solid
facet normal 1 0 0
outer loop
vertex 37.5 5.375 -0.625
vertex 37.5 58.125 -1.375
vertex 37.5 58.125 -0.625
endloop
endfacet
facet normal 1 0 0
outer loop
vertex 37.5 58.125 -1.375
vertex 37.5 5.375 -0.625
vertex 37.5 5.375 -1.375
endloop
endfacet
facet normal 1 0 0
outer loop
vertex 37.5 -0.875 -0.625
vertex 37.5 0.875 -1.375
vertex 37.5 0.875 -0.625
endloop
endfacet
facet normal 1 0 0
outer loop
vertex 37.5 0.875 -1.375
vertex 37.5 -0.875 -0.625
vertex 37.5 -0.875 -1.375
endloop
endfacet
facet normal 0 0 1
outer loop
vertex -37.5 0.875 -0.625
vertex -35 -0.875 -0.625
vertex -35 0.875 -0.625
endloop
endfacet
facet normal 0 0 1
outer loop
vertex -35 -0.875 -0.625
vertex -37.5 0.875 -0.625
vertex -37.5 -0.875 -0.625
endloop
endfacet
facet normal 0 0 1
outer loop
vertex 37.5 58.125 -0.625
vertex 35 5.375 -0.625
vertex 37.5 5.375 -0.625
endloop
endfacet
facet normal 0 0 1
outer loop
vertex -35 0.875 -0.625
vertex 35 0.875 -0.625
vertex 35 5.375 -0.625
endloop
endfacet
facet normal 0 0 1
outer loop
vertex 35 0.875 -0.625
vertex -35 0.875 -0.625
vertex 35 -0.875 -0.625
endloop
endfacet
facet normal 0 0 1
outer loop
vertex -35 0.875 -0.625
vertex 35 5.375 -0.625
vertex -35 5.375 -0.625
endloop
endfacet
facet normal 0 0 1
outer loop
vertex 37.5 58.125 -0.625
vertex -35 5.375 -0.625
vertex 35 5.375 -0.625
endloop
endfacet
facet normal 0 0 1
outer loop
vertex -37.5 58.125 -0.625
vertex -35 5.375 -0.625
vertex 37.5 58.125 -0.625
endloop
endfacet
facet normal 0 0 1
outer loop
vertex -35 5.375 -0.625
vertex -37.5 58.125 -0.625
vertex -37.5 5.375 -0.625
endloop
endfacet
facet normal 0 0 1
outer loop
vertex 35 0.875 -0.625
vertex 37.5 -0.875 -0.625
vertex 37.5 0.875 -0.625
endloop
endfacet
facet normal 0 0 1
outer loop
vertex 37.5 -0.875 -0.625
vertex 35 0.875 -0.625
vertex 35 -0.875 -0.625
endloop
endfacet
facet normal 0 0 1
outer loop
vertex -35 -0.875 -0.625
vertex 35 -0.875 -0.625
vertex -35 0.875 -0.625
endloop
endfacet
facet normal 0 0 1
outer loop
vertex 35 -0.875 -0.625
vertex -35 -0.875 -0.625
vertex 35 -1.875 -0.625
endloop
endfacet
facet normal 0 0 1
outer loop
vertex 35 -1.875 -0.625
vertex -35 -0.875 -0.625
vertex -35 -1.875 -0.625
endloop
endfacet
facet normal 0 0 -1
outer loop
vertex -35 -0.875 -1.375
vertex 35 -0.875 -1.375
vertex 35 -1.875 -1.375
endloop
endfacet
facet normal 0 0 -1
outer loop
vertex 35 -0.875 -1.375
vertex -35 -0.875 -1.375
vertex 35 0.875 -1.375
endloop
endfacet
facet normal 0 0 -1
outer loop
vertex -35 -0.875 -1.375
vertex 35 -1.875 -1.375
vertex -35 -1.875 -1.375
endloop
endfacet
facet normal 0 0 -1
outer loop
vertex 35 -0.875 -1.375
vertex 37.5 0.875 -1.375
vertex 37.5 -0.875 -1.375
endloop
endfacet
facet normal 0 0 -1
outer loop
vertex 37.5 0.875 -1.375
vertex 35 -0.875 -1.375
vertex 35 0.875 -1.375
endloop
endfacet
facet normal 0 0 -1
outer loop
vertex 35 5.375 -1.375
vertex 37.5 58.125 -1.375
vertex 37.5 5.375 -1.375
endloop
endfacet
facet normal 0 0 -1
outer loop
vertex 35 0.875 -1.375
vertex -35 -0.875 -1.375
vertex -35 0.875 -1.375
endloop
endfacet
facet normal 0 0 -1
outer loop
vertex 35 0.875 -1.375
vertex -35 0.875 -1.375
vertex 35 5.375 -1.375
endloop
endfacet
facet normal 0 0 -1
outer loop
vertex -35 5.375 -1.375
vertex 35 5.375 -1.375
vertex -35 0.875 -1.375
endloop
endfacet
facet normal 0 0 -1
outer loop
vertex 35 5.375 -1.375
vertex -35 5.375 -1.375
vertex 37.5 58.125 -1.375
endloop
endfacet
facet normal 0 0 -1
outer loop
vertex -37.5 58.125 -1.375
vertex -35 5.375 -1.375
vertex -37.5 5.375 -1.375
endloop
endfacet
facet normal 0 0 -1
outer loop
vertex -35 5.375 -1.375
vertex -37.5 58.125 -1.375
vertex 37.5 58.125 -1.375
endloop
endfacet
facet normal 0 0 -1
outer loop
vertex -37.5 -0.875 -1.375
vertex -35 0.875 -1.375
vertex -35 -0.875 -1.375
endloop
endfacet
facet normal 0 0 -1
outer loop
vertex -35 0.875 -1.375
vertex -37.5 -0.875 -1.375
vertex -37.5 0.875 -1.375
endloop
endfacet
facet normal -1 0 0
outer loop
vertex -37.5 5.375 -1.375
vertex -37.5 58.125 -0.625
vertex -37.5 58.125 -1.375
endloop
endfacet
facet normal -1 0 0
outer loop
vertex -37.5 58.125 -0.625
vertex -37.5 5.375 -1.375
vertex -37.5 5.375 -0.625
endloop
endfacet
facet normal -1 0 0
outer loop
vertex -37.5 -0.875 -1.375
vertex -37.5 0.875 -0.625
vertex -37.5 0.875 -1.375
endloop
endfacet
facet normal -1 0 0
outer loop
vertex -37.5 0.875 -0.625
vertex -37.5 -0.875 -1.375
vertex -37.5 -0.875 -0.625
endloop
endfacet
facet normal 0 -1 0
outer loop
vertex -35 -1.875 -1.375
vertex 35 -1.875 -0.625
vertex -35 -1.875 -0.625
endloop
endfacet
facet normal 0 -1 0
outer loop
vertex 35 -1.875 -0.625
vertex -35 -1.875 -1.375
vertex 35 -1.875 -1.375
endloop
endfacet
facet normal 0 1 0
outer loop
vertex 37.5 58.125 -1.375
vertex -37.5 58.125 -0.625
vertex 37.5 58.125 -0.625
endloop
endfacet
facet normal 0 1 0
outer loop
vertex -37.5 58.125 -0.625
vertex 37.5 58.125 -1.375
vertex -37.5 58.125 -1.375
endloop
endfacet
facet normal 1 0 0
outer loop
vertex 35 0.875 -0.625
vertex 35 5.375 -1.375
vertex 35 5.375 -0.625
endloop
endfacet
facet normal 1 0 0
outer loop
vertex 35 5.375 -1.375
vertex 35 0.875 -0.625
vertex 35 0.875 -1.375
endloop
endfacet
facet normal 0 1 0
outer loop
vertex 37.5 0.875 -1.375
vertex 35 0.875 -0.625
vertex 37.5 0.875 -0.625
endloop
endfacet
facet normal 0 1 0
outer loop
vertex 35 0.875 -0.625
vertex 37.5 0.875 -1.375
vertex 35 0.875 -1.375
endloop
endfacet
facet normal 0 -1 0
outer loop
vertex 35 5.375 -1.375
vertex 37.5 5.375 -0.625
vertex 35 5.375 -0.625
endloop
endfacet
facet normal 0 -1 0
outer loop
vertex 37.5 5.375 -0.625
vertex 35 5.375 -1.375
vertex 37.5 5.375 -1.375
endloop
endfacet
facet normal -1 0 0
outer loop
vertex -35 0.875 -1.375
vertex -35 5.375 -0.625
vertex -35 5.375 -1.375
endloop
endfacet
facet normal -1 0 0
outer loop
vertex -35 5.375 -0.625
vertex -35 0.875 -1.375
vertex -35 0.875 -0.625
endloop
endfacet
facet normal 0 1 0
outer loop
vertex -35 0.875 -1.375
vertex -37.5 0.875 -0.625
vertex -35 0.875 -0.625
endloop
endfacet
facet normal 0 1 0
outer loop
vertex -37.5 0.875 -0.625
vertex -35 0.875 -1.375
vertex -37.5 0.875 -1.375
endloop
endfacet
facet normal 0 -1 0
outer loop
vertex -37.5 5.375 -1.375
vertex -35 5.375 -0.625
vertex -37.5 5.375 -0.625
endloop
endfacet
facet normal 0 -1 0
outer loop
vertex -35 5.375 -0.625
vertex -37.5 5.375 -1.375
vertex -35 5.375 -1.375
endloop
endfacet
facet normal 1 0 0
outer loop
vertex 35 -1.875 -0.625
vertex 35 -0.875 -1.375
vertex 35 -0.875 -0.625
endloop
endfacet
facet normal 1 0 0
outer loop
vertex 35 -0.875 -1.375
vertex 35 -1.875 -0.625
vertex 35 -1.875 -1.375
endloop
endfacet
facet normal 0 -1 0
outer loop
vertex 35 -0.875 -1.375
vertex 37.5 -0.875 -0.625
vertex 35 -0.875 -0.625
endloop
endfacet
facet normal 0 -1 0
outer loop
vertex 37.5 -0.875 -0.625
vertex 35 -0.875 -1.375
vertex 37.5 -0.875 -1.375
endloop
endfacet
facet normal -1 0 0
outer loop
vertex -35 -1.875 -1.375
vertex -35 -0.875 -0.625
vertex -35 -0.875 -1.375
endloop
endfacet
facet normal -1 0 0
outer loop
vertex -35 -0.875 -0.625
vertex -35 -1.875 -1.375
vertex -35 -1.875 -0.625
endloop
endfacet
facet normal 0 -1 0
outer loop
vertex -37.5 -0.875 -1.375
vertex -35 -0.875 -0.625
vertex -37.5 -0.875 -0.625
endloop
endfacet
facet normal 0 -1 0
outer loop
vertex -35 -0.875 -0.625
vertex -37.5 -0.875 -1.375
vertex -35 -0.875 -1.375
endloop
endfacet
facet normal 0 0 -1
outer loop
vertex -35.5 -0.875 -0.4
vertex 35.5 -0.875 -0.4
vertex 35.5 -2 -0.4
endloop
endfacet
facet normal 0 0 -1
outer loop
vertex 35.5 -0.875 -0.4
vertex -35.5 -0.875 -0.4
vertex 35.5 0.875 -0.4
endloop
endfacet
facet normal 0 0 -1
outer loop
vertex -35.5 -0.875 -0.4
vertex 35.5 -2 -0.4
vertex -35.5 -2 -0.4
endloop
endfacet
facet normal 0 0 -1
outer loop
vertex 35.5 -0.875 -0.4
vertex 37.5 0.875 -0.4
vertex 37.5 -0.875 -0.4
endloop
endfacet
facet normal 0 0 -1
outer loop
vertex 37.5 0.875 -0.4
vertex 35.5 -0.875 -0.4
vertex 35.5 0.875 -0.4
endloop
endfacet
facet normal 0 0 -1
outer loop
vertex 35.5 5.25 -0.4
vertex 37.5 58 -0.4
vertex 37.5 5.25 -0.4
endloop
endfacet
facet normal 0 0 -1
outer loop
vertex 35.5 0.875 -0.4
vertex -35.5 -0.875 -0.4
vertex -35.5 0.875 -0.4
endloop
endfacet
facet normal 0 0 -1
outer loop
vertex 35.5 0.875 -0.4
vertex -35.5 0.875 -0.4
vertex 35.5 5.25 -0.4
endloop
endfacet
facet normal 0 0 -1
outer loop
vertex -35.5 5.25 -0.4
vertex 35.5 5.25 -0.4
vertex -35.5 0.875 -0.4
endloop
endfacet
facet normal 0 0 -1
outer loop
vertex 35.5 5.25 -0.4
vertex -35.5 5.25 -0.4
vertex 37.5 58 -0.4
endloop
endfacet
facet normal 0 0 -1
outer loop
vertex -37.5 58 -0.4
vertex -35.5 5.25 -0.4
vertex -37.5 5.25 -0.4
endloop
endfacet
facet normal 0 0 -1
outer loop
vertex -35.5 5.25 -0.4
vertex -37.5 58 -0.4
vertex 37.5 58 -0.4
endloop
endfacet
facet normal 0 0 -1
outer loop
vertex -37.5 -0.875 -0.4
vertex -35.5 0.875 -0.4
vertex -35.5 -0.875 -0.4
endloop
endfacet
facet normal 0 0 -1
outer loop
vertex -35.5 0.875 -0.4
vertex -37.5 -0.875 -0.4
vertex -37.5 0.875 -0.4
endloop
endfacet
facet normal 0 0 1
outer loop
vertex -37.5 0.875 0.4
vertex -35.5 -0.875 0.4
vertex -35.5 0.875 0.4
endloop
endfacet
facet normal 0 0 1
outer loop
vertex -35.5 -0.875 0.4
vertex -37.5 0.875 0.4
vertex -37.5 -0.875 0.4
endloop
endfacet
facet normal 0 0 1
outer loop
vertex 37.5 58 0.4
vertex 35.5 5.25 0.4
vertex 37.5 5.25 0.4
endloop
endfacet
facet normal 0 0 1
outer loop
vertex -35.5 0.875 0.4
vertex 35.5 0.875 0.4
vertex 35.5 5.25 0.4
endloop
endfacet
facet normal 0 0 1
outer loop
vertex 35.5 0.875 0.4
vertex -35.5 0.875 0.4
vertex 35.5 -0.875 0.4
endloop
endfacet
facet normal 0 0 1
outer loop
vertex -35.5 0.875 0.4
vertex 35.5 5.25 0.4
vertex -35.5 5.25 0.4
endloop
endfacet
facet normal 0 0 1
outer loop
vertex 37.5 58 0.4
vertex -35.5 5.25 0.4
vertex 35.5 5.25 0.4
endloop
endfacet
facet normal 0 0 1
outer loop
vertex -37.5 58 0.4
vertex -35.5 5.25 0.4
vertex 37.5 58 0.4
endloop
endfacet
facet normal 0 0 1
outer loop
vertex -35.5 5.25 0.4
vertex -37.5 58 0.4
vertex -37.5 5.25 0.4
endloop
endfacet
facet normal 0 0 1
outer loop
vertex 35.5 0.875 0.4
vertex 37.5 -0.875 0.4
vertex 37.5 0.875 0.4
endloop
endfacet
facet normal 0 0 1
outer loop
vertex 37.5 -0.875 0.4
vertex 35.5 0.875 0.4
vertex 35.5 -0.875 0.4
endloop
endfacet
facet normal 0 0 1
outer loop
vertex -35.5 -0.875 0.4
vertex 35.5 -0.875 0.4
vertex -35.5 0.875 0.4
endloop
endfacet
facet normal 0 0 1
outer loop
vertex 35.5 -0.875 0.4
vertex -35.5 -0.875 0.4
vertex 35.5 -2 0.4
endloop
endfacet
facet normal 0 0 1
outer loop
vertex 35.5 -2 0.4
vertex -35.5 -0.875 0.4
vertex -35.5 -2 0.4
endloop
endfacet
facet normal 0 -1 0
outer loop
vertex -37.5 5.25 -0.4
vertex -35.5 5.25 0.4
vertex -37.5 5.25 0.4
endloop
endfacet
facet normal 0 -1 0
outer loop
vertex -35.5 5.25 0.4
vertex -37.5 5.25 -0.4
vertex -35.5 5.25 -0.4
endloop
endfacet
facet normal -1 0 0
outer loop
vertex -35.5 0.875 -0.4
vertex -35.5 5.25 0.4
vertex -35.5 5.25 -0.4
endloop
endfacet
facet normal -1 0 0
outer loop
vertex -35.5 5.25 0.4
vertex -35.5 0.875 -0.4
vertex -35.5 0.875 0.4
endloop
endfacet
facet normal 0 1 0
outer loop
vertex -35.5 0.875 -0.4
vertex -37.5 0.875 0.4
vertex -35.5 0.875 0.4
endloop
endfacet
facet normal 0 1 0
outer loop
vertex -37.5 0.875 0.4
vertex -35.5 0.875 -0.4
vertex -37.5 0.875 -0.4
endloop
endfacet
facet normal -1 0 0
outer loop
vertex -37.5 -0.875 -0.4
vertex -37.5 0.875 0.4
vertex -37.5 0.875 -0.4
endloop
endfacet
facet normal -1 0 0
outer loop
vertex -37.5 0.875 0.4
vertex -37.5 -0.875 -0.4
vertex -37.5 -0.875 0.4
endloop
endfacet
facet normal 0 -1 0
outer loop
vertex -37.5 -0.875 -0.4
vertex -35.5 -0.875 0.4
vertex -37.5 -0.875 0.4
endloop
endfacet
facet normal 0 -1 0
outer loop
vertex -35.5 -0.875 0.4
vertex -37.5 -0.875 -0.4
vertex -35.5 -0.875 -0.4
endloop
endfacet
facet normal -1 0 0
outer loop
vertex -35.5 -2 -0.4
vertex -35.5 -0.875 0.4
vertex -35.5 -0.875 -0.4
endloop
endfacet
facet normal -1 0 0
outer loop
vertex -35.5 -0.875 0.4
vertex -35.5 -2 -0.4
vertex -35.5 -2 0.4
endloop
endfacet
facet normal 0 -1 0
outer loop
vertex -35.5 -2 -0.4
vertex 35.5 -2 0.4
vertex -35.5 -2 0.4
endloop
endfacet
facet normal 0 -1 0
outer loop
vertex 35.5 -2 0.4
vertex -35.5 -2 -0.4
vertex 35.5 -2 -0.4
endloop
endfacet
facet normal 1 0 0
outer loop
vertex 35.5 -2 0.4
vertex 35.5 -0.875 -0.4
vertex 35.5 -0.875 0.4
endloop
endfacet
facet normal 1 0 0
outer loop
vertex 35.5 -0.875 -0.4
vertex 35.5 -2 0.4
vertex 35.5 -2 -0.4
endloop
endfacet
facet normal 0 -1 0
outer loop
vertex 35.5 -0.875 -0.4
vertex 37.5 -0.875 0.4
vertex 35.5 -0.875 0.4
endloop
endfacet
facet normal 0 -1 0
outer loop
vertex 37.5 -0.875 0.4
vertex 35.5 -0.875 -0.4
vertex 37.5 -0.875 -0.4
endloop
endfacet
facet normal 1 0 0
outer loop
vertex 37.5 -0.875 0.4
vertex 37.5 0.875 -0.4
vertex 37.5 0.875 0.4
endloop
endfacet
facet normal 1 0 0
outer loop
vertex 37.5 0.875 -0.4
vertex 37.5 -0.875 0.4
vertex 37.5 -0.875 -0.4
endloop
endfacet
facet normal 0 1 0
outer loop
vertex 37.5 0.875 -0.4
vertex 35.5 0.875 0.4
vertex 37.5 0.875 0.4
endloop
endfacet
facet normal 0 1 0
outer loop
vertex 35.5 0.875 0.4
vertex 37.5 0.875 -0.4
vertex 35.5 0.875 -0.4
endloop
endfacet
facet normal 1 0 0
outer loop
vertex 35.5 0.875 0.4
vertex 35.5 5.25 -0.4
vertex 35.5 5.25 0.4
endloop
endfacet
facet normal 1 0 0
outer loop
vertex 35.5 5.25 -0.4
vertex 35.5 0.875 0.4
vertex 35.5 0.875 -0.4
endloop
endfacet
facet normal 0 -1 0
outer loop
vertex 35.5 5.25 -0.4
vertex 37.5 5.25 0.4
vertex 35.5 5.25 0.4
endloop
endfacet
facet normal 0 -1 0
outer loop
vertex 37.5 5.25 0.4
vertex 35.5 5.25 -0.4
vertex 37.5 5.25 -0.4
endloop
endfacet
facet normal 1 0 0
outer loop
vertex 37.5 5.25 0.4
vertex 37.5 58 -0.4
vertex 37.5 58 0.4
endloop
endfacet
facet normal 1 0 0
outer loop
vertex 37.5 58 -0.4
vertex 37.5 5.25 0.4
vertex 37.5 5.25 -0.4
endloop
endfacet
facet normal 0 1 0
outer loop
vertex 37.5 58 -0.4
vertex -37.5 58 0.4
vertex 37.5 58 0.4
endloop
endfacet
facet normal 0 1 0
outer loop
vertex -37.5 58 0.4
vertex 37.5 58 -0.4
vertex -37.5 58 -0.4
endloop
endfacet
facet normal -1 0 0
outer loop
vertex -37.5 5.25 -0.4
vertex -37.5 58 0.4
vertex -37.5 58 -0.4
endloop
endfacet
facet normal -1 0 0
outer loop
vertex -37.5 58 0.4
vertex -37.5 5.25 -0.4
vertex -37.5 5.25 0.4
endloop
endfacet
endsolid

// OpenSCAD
/*
 * 0 = Mitte der Drehachse
 *
 * werden sinnigerweise überhaupt nicht gedruckt, weil Dauer und Materialverbrauch
 * die Achse lässt sich nicht fein und dennoch stabil drucken
 * die Lochgröße im Blätterrad ist auf gelaserte (siehe SVG) Platten ausgelegt.
 *
 * die in dieser Datei verwendete Stärke ist druckbar, damit können Prototypen
 * erstellt werden, allerdings sind dann Anpassungen am Blätterrad notwendig
 */

breite = 75;
pinlaenge = 2;
pindurchmesser = 1.75;
pinabstand = 2;
radabstand = 5.25;
hoehe = 60;
dicke = 0.8;

module Plaettchen_alt() {
	translate([0,-28.125,0]) difference() {
		cube(size=[75, 60, 0.75], center=true);

		// Ausgeschnitten: 29.00 - 30.00 und 22.75 - 27.25
		// Drehachse: 28.125
		translate([36.75, 25, 0]) cube(size=[3.5, 4.5, 2], center=true);
		translate([-36.75, 25, 0]) cube(size=[3.5, 4.5, 2], center=true);
		translate([36.75, 29.75, 0]) cube(size=[3.5, 1.5, 2], center=true);
		translate([-36.75, 29.75, 0]) cube(size=[3.5, 1.5, 2], center=true);
	}
}

module Plaettchen2D() {
	translate([0, -pinabstand, 0]) for (i = [+1,-1]) {
		scale([i, 1, 1]) polygon([
			[breite/2 - pinlaenge, 0],
			[breite/2 - pinlaenge, pinabstand - pindurchmesser/2],
			[breite/2, pinabstand - pindurchmesser/2],
			[breite/2, pinabstand + pindurchmesser/2],
			[breite/2 - pinlaenge, pinabstand + pindurchmesser/2],
			[breite/2 - pinlaenge, pinabstand + radabstand],
			[breite/2, pinabstand + radabstand],
			[breite/2, hoehe],
			[0, hoehe],
			[0, 0]
		]);
	}
}


module Plaettchen() {
	linear_extrude(height = dicke, center = true) Plaettchen2D();
}

Plaettchen();

translate([0, 0, -1]) mirror([0,1,0]) Plaettchen_alt();
